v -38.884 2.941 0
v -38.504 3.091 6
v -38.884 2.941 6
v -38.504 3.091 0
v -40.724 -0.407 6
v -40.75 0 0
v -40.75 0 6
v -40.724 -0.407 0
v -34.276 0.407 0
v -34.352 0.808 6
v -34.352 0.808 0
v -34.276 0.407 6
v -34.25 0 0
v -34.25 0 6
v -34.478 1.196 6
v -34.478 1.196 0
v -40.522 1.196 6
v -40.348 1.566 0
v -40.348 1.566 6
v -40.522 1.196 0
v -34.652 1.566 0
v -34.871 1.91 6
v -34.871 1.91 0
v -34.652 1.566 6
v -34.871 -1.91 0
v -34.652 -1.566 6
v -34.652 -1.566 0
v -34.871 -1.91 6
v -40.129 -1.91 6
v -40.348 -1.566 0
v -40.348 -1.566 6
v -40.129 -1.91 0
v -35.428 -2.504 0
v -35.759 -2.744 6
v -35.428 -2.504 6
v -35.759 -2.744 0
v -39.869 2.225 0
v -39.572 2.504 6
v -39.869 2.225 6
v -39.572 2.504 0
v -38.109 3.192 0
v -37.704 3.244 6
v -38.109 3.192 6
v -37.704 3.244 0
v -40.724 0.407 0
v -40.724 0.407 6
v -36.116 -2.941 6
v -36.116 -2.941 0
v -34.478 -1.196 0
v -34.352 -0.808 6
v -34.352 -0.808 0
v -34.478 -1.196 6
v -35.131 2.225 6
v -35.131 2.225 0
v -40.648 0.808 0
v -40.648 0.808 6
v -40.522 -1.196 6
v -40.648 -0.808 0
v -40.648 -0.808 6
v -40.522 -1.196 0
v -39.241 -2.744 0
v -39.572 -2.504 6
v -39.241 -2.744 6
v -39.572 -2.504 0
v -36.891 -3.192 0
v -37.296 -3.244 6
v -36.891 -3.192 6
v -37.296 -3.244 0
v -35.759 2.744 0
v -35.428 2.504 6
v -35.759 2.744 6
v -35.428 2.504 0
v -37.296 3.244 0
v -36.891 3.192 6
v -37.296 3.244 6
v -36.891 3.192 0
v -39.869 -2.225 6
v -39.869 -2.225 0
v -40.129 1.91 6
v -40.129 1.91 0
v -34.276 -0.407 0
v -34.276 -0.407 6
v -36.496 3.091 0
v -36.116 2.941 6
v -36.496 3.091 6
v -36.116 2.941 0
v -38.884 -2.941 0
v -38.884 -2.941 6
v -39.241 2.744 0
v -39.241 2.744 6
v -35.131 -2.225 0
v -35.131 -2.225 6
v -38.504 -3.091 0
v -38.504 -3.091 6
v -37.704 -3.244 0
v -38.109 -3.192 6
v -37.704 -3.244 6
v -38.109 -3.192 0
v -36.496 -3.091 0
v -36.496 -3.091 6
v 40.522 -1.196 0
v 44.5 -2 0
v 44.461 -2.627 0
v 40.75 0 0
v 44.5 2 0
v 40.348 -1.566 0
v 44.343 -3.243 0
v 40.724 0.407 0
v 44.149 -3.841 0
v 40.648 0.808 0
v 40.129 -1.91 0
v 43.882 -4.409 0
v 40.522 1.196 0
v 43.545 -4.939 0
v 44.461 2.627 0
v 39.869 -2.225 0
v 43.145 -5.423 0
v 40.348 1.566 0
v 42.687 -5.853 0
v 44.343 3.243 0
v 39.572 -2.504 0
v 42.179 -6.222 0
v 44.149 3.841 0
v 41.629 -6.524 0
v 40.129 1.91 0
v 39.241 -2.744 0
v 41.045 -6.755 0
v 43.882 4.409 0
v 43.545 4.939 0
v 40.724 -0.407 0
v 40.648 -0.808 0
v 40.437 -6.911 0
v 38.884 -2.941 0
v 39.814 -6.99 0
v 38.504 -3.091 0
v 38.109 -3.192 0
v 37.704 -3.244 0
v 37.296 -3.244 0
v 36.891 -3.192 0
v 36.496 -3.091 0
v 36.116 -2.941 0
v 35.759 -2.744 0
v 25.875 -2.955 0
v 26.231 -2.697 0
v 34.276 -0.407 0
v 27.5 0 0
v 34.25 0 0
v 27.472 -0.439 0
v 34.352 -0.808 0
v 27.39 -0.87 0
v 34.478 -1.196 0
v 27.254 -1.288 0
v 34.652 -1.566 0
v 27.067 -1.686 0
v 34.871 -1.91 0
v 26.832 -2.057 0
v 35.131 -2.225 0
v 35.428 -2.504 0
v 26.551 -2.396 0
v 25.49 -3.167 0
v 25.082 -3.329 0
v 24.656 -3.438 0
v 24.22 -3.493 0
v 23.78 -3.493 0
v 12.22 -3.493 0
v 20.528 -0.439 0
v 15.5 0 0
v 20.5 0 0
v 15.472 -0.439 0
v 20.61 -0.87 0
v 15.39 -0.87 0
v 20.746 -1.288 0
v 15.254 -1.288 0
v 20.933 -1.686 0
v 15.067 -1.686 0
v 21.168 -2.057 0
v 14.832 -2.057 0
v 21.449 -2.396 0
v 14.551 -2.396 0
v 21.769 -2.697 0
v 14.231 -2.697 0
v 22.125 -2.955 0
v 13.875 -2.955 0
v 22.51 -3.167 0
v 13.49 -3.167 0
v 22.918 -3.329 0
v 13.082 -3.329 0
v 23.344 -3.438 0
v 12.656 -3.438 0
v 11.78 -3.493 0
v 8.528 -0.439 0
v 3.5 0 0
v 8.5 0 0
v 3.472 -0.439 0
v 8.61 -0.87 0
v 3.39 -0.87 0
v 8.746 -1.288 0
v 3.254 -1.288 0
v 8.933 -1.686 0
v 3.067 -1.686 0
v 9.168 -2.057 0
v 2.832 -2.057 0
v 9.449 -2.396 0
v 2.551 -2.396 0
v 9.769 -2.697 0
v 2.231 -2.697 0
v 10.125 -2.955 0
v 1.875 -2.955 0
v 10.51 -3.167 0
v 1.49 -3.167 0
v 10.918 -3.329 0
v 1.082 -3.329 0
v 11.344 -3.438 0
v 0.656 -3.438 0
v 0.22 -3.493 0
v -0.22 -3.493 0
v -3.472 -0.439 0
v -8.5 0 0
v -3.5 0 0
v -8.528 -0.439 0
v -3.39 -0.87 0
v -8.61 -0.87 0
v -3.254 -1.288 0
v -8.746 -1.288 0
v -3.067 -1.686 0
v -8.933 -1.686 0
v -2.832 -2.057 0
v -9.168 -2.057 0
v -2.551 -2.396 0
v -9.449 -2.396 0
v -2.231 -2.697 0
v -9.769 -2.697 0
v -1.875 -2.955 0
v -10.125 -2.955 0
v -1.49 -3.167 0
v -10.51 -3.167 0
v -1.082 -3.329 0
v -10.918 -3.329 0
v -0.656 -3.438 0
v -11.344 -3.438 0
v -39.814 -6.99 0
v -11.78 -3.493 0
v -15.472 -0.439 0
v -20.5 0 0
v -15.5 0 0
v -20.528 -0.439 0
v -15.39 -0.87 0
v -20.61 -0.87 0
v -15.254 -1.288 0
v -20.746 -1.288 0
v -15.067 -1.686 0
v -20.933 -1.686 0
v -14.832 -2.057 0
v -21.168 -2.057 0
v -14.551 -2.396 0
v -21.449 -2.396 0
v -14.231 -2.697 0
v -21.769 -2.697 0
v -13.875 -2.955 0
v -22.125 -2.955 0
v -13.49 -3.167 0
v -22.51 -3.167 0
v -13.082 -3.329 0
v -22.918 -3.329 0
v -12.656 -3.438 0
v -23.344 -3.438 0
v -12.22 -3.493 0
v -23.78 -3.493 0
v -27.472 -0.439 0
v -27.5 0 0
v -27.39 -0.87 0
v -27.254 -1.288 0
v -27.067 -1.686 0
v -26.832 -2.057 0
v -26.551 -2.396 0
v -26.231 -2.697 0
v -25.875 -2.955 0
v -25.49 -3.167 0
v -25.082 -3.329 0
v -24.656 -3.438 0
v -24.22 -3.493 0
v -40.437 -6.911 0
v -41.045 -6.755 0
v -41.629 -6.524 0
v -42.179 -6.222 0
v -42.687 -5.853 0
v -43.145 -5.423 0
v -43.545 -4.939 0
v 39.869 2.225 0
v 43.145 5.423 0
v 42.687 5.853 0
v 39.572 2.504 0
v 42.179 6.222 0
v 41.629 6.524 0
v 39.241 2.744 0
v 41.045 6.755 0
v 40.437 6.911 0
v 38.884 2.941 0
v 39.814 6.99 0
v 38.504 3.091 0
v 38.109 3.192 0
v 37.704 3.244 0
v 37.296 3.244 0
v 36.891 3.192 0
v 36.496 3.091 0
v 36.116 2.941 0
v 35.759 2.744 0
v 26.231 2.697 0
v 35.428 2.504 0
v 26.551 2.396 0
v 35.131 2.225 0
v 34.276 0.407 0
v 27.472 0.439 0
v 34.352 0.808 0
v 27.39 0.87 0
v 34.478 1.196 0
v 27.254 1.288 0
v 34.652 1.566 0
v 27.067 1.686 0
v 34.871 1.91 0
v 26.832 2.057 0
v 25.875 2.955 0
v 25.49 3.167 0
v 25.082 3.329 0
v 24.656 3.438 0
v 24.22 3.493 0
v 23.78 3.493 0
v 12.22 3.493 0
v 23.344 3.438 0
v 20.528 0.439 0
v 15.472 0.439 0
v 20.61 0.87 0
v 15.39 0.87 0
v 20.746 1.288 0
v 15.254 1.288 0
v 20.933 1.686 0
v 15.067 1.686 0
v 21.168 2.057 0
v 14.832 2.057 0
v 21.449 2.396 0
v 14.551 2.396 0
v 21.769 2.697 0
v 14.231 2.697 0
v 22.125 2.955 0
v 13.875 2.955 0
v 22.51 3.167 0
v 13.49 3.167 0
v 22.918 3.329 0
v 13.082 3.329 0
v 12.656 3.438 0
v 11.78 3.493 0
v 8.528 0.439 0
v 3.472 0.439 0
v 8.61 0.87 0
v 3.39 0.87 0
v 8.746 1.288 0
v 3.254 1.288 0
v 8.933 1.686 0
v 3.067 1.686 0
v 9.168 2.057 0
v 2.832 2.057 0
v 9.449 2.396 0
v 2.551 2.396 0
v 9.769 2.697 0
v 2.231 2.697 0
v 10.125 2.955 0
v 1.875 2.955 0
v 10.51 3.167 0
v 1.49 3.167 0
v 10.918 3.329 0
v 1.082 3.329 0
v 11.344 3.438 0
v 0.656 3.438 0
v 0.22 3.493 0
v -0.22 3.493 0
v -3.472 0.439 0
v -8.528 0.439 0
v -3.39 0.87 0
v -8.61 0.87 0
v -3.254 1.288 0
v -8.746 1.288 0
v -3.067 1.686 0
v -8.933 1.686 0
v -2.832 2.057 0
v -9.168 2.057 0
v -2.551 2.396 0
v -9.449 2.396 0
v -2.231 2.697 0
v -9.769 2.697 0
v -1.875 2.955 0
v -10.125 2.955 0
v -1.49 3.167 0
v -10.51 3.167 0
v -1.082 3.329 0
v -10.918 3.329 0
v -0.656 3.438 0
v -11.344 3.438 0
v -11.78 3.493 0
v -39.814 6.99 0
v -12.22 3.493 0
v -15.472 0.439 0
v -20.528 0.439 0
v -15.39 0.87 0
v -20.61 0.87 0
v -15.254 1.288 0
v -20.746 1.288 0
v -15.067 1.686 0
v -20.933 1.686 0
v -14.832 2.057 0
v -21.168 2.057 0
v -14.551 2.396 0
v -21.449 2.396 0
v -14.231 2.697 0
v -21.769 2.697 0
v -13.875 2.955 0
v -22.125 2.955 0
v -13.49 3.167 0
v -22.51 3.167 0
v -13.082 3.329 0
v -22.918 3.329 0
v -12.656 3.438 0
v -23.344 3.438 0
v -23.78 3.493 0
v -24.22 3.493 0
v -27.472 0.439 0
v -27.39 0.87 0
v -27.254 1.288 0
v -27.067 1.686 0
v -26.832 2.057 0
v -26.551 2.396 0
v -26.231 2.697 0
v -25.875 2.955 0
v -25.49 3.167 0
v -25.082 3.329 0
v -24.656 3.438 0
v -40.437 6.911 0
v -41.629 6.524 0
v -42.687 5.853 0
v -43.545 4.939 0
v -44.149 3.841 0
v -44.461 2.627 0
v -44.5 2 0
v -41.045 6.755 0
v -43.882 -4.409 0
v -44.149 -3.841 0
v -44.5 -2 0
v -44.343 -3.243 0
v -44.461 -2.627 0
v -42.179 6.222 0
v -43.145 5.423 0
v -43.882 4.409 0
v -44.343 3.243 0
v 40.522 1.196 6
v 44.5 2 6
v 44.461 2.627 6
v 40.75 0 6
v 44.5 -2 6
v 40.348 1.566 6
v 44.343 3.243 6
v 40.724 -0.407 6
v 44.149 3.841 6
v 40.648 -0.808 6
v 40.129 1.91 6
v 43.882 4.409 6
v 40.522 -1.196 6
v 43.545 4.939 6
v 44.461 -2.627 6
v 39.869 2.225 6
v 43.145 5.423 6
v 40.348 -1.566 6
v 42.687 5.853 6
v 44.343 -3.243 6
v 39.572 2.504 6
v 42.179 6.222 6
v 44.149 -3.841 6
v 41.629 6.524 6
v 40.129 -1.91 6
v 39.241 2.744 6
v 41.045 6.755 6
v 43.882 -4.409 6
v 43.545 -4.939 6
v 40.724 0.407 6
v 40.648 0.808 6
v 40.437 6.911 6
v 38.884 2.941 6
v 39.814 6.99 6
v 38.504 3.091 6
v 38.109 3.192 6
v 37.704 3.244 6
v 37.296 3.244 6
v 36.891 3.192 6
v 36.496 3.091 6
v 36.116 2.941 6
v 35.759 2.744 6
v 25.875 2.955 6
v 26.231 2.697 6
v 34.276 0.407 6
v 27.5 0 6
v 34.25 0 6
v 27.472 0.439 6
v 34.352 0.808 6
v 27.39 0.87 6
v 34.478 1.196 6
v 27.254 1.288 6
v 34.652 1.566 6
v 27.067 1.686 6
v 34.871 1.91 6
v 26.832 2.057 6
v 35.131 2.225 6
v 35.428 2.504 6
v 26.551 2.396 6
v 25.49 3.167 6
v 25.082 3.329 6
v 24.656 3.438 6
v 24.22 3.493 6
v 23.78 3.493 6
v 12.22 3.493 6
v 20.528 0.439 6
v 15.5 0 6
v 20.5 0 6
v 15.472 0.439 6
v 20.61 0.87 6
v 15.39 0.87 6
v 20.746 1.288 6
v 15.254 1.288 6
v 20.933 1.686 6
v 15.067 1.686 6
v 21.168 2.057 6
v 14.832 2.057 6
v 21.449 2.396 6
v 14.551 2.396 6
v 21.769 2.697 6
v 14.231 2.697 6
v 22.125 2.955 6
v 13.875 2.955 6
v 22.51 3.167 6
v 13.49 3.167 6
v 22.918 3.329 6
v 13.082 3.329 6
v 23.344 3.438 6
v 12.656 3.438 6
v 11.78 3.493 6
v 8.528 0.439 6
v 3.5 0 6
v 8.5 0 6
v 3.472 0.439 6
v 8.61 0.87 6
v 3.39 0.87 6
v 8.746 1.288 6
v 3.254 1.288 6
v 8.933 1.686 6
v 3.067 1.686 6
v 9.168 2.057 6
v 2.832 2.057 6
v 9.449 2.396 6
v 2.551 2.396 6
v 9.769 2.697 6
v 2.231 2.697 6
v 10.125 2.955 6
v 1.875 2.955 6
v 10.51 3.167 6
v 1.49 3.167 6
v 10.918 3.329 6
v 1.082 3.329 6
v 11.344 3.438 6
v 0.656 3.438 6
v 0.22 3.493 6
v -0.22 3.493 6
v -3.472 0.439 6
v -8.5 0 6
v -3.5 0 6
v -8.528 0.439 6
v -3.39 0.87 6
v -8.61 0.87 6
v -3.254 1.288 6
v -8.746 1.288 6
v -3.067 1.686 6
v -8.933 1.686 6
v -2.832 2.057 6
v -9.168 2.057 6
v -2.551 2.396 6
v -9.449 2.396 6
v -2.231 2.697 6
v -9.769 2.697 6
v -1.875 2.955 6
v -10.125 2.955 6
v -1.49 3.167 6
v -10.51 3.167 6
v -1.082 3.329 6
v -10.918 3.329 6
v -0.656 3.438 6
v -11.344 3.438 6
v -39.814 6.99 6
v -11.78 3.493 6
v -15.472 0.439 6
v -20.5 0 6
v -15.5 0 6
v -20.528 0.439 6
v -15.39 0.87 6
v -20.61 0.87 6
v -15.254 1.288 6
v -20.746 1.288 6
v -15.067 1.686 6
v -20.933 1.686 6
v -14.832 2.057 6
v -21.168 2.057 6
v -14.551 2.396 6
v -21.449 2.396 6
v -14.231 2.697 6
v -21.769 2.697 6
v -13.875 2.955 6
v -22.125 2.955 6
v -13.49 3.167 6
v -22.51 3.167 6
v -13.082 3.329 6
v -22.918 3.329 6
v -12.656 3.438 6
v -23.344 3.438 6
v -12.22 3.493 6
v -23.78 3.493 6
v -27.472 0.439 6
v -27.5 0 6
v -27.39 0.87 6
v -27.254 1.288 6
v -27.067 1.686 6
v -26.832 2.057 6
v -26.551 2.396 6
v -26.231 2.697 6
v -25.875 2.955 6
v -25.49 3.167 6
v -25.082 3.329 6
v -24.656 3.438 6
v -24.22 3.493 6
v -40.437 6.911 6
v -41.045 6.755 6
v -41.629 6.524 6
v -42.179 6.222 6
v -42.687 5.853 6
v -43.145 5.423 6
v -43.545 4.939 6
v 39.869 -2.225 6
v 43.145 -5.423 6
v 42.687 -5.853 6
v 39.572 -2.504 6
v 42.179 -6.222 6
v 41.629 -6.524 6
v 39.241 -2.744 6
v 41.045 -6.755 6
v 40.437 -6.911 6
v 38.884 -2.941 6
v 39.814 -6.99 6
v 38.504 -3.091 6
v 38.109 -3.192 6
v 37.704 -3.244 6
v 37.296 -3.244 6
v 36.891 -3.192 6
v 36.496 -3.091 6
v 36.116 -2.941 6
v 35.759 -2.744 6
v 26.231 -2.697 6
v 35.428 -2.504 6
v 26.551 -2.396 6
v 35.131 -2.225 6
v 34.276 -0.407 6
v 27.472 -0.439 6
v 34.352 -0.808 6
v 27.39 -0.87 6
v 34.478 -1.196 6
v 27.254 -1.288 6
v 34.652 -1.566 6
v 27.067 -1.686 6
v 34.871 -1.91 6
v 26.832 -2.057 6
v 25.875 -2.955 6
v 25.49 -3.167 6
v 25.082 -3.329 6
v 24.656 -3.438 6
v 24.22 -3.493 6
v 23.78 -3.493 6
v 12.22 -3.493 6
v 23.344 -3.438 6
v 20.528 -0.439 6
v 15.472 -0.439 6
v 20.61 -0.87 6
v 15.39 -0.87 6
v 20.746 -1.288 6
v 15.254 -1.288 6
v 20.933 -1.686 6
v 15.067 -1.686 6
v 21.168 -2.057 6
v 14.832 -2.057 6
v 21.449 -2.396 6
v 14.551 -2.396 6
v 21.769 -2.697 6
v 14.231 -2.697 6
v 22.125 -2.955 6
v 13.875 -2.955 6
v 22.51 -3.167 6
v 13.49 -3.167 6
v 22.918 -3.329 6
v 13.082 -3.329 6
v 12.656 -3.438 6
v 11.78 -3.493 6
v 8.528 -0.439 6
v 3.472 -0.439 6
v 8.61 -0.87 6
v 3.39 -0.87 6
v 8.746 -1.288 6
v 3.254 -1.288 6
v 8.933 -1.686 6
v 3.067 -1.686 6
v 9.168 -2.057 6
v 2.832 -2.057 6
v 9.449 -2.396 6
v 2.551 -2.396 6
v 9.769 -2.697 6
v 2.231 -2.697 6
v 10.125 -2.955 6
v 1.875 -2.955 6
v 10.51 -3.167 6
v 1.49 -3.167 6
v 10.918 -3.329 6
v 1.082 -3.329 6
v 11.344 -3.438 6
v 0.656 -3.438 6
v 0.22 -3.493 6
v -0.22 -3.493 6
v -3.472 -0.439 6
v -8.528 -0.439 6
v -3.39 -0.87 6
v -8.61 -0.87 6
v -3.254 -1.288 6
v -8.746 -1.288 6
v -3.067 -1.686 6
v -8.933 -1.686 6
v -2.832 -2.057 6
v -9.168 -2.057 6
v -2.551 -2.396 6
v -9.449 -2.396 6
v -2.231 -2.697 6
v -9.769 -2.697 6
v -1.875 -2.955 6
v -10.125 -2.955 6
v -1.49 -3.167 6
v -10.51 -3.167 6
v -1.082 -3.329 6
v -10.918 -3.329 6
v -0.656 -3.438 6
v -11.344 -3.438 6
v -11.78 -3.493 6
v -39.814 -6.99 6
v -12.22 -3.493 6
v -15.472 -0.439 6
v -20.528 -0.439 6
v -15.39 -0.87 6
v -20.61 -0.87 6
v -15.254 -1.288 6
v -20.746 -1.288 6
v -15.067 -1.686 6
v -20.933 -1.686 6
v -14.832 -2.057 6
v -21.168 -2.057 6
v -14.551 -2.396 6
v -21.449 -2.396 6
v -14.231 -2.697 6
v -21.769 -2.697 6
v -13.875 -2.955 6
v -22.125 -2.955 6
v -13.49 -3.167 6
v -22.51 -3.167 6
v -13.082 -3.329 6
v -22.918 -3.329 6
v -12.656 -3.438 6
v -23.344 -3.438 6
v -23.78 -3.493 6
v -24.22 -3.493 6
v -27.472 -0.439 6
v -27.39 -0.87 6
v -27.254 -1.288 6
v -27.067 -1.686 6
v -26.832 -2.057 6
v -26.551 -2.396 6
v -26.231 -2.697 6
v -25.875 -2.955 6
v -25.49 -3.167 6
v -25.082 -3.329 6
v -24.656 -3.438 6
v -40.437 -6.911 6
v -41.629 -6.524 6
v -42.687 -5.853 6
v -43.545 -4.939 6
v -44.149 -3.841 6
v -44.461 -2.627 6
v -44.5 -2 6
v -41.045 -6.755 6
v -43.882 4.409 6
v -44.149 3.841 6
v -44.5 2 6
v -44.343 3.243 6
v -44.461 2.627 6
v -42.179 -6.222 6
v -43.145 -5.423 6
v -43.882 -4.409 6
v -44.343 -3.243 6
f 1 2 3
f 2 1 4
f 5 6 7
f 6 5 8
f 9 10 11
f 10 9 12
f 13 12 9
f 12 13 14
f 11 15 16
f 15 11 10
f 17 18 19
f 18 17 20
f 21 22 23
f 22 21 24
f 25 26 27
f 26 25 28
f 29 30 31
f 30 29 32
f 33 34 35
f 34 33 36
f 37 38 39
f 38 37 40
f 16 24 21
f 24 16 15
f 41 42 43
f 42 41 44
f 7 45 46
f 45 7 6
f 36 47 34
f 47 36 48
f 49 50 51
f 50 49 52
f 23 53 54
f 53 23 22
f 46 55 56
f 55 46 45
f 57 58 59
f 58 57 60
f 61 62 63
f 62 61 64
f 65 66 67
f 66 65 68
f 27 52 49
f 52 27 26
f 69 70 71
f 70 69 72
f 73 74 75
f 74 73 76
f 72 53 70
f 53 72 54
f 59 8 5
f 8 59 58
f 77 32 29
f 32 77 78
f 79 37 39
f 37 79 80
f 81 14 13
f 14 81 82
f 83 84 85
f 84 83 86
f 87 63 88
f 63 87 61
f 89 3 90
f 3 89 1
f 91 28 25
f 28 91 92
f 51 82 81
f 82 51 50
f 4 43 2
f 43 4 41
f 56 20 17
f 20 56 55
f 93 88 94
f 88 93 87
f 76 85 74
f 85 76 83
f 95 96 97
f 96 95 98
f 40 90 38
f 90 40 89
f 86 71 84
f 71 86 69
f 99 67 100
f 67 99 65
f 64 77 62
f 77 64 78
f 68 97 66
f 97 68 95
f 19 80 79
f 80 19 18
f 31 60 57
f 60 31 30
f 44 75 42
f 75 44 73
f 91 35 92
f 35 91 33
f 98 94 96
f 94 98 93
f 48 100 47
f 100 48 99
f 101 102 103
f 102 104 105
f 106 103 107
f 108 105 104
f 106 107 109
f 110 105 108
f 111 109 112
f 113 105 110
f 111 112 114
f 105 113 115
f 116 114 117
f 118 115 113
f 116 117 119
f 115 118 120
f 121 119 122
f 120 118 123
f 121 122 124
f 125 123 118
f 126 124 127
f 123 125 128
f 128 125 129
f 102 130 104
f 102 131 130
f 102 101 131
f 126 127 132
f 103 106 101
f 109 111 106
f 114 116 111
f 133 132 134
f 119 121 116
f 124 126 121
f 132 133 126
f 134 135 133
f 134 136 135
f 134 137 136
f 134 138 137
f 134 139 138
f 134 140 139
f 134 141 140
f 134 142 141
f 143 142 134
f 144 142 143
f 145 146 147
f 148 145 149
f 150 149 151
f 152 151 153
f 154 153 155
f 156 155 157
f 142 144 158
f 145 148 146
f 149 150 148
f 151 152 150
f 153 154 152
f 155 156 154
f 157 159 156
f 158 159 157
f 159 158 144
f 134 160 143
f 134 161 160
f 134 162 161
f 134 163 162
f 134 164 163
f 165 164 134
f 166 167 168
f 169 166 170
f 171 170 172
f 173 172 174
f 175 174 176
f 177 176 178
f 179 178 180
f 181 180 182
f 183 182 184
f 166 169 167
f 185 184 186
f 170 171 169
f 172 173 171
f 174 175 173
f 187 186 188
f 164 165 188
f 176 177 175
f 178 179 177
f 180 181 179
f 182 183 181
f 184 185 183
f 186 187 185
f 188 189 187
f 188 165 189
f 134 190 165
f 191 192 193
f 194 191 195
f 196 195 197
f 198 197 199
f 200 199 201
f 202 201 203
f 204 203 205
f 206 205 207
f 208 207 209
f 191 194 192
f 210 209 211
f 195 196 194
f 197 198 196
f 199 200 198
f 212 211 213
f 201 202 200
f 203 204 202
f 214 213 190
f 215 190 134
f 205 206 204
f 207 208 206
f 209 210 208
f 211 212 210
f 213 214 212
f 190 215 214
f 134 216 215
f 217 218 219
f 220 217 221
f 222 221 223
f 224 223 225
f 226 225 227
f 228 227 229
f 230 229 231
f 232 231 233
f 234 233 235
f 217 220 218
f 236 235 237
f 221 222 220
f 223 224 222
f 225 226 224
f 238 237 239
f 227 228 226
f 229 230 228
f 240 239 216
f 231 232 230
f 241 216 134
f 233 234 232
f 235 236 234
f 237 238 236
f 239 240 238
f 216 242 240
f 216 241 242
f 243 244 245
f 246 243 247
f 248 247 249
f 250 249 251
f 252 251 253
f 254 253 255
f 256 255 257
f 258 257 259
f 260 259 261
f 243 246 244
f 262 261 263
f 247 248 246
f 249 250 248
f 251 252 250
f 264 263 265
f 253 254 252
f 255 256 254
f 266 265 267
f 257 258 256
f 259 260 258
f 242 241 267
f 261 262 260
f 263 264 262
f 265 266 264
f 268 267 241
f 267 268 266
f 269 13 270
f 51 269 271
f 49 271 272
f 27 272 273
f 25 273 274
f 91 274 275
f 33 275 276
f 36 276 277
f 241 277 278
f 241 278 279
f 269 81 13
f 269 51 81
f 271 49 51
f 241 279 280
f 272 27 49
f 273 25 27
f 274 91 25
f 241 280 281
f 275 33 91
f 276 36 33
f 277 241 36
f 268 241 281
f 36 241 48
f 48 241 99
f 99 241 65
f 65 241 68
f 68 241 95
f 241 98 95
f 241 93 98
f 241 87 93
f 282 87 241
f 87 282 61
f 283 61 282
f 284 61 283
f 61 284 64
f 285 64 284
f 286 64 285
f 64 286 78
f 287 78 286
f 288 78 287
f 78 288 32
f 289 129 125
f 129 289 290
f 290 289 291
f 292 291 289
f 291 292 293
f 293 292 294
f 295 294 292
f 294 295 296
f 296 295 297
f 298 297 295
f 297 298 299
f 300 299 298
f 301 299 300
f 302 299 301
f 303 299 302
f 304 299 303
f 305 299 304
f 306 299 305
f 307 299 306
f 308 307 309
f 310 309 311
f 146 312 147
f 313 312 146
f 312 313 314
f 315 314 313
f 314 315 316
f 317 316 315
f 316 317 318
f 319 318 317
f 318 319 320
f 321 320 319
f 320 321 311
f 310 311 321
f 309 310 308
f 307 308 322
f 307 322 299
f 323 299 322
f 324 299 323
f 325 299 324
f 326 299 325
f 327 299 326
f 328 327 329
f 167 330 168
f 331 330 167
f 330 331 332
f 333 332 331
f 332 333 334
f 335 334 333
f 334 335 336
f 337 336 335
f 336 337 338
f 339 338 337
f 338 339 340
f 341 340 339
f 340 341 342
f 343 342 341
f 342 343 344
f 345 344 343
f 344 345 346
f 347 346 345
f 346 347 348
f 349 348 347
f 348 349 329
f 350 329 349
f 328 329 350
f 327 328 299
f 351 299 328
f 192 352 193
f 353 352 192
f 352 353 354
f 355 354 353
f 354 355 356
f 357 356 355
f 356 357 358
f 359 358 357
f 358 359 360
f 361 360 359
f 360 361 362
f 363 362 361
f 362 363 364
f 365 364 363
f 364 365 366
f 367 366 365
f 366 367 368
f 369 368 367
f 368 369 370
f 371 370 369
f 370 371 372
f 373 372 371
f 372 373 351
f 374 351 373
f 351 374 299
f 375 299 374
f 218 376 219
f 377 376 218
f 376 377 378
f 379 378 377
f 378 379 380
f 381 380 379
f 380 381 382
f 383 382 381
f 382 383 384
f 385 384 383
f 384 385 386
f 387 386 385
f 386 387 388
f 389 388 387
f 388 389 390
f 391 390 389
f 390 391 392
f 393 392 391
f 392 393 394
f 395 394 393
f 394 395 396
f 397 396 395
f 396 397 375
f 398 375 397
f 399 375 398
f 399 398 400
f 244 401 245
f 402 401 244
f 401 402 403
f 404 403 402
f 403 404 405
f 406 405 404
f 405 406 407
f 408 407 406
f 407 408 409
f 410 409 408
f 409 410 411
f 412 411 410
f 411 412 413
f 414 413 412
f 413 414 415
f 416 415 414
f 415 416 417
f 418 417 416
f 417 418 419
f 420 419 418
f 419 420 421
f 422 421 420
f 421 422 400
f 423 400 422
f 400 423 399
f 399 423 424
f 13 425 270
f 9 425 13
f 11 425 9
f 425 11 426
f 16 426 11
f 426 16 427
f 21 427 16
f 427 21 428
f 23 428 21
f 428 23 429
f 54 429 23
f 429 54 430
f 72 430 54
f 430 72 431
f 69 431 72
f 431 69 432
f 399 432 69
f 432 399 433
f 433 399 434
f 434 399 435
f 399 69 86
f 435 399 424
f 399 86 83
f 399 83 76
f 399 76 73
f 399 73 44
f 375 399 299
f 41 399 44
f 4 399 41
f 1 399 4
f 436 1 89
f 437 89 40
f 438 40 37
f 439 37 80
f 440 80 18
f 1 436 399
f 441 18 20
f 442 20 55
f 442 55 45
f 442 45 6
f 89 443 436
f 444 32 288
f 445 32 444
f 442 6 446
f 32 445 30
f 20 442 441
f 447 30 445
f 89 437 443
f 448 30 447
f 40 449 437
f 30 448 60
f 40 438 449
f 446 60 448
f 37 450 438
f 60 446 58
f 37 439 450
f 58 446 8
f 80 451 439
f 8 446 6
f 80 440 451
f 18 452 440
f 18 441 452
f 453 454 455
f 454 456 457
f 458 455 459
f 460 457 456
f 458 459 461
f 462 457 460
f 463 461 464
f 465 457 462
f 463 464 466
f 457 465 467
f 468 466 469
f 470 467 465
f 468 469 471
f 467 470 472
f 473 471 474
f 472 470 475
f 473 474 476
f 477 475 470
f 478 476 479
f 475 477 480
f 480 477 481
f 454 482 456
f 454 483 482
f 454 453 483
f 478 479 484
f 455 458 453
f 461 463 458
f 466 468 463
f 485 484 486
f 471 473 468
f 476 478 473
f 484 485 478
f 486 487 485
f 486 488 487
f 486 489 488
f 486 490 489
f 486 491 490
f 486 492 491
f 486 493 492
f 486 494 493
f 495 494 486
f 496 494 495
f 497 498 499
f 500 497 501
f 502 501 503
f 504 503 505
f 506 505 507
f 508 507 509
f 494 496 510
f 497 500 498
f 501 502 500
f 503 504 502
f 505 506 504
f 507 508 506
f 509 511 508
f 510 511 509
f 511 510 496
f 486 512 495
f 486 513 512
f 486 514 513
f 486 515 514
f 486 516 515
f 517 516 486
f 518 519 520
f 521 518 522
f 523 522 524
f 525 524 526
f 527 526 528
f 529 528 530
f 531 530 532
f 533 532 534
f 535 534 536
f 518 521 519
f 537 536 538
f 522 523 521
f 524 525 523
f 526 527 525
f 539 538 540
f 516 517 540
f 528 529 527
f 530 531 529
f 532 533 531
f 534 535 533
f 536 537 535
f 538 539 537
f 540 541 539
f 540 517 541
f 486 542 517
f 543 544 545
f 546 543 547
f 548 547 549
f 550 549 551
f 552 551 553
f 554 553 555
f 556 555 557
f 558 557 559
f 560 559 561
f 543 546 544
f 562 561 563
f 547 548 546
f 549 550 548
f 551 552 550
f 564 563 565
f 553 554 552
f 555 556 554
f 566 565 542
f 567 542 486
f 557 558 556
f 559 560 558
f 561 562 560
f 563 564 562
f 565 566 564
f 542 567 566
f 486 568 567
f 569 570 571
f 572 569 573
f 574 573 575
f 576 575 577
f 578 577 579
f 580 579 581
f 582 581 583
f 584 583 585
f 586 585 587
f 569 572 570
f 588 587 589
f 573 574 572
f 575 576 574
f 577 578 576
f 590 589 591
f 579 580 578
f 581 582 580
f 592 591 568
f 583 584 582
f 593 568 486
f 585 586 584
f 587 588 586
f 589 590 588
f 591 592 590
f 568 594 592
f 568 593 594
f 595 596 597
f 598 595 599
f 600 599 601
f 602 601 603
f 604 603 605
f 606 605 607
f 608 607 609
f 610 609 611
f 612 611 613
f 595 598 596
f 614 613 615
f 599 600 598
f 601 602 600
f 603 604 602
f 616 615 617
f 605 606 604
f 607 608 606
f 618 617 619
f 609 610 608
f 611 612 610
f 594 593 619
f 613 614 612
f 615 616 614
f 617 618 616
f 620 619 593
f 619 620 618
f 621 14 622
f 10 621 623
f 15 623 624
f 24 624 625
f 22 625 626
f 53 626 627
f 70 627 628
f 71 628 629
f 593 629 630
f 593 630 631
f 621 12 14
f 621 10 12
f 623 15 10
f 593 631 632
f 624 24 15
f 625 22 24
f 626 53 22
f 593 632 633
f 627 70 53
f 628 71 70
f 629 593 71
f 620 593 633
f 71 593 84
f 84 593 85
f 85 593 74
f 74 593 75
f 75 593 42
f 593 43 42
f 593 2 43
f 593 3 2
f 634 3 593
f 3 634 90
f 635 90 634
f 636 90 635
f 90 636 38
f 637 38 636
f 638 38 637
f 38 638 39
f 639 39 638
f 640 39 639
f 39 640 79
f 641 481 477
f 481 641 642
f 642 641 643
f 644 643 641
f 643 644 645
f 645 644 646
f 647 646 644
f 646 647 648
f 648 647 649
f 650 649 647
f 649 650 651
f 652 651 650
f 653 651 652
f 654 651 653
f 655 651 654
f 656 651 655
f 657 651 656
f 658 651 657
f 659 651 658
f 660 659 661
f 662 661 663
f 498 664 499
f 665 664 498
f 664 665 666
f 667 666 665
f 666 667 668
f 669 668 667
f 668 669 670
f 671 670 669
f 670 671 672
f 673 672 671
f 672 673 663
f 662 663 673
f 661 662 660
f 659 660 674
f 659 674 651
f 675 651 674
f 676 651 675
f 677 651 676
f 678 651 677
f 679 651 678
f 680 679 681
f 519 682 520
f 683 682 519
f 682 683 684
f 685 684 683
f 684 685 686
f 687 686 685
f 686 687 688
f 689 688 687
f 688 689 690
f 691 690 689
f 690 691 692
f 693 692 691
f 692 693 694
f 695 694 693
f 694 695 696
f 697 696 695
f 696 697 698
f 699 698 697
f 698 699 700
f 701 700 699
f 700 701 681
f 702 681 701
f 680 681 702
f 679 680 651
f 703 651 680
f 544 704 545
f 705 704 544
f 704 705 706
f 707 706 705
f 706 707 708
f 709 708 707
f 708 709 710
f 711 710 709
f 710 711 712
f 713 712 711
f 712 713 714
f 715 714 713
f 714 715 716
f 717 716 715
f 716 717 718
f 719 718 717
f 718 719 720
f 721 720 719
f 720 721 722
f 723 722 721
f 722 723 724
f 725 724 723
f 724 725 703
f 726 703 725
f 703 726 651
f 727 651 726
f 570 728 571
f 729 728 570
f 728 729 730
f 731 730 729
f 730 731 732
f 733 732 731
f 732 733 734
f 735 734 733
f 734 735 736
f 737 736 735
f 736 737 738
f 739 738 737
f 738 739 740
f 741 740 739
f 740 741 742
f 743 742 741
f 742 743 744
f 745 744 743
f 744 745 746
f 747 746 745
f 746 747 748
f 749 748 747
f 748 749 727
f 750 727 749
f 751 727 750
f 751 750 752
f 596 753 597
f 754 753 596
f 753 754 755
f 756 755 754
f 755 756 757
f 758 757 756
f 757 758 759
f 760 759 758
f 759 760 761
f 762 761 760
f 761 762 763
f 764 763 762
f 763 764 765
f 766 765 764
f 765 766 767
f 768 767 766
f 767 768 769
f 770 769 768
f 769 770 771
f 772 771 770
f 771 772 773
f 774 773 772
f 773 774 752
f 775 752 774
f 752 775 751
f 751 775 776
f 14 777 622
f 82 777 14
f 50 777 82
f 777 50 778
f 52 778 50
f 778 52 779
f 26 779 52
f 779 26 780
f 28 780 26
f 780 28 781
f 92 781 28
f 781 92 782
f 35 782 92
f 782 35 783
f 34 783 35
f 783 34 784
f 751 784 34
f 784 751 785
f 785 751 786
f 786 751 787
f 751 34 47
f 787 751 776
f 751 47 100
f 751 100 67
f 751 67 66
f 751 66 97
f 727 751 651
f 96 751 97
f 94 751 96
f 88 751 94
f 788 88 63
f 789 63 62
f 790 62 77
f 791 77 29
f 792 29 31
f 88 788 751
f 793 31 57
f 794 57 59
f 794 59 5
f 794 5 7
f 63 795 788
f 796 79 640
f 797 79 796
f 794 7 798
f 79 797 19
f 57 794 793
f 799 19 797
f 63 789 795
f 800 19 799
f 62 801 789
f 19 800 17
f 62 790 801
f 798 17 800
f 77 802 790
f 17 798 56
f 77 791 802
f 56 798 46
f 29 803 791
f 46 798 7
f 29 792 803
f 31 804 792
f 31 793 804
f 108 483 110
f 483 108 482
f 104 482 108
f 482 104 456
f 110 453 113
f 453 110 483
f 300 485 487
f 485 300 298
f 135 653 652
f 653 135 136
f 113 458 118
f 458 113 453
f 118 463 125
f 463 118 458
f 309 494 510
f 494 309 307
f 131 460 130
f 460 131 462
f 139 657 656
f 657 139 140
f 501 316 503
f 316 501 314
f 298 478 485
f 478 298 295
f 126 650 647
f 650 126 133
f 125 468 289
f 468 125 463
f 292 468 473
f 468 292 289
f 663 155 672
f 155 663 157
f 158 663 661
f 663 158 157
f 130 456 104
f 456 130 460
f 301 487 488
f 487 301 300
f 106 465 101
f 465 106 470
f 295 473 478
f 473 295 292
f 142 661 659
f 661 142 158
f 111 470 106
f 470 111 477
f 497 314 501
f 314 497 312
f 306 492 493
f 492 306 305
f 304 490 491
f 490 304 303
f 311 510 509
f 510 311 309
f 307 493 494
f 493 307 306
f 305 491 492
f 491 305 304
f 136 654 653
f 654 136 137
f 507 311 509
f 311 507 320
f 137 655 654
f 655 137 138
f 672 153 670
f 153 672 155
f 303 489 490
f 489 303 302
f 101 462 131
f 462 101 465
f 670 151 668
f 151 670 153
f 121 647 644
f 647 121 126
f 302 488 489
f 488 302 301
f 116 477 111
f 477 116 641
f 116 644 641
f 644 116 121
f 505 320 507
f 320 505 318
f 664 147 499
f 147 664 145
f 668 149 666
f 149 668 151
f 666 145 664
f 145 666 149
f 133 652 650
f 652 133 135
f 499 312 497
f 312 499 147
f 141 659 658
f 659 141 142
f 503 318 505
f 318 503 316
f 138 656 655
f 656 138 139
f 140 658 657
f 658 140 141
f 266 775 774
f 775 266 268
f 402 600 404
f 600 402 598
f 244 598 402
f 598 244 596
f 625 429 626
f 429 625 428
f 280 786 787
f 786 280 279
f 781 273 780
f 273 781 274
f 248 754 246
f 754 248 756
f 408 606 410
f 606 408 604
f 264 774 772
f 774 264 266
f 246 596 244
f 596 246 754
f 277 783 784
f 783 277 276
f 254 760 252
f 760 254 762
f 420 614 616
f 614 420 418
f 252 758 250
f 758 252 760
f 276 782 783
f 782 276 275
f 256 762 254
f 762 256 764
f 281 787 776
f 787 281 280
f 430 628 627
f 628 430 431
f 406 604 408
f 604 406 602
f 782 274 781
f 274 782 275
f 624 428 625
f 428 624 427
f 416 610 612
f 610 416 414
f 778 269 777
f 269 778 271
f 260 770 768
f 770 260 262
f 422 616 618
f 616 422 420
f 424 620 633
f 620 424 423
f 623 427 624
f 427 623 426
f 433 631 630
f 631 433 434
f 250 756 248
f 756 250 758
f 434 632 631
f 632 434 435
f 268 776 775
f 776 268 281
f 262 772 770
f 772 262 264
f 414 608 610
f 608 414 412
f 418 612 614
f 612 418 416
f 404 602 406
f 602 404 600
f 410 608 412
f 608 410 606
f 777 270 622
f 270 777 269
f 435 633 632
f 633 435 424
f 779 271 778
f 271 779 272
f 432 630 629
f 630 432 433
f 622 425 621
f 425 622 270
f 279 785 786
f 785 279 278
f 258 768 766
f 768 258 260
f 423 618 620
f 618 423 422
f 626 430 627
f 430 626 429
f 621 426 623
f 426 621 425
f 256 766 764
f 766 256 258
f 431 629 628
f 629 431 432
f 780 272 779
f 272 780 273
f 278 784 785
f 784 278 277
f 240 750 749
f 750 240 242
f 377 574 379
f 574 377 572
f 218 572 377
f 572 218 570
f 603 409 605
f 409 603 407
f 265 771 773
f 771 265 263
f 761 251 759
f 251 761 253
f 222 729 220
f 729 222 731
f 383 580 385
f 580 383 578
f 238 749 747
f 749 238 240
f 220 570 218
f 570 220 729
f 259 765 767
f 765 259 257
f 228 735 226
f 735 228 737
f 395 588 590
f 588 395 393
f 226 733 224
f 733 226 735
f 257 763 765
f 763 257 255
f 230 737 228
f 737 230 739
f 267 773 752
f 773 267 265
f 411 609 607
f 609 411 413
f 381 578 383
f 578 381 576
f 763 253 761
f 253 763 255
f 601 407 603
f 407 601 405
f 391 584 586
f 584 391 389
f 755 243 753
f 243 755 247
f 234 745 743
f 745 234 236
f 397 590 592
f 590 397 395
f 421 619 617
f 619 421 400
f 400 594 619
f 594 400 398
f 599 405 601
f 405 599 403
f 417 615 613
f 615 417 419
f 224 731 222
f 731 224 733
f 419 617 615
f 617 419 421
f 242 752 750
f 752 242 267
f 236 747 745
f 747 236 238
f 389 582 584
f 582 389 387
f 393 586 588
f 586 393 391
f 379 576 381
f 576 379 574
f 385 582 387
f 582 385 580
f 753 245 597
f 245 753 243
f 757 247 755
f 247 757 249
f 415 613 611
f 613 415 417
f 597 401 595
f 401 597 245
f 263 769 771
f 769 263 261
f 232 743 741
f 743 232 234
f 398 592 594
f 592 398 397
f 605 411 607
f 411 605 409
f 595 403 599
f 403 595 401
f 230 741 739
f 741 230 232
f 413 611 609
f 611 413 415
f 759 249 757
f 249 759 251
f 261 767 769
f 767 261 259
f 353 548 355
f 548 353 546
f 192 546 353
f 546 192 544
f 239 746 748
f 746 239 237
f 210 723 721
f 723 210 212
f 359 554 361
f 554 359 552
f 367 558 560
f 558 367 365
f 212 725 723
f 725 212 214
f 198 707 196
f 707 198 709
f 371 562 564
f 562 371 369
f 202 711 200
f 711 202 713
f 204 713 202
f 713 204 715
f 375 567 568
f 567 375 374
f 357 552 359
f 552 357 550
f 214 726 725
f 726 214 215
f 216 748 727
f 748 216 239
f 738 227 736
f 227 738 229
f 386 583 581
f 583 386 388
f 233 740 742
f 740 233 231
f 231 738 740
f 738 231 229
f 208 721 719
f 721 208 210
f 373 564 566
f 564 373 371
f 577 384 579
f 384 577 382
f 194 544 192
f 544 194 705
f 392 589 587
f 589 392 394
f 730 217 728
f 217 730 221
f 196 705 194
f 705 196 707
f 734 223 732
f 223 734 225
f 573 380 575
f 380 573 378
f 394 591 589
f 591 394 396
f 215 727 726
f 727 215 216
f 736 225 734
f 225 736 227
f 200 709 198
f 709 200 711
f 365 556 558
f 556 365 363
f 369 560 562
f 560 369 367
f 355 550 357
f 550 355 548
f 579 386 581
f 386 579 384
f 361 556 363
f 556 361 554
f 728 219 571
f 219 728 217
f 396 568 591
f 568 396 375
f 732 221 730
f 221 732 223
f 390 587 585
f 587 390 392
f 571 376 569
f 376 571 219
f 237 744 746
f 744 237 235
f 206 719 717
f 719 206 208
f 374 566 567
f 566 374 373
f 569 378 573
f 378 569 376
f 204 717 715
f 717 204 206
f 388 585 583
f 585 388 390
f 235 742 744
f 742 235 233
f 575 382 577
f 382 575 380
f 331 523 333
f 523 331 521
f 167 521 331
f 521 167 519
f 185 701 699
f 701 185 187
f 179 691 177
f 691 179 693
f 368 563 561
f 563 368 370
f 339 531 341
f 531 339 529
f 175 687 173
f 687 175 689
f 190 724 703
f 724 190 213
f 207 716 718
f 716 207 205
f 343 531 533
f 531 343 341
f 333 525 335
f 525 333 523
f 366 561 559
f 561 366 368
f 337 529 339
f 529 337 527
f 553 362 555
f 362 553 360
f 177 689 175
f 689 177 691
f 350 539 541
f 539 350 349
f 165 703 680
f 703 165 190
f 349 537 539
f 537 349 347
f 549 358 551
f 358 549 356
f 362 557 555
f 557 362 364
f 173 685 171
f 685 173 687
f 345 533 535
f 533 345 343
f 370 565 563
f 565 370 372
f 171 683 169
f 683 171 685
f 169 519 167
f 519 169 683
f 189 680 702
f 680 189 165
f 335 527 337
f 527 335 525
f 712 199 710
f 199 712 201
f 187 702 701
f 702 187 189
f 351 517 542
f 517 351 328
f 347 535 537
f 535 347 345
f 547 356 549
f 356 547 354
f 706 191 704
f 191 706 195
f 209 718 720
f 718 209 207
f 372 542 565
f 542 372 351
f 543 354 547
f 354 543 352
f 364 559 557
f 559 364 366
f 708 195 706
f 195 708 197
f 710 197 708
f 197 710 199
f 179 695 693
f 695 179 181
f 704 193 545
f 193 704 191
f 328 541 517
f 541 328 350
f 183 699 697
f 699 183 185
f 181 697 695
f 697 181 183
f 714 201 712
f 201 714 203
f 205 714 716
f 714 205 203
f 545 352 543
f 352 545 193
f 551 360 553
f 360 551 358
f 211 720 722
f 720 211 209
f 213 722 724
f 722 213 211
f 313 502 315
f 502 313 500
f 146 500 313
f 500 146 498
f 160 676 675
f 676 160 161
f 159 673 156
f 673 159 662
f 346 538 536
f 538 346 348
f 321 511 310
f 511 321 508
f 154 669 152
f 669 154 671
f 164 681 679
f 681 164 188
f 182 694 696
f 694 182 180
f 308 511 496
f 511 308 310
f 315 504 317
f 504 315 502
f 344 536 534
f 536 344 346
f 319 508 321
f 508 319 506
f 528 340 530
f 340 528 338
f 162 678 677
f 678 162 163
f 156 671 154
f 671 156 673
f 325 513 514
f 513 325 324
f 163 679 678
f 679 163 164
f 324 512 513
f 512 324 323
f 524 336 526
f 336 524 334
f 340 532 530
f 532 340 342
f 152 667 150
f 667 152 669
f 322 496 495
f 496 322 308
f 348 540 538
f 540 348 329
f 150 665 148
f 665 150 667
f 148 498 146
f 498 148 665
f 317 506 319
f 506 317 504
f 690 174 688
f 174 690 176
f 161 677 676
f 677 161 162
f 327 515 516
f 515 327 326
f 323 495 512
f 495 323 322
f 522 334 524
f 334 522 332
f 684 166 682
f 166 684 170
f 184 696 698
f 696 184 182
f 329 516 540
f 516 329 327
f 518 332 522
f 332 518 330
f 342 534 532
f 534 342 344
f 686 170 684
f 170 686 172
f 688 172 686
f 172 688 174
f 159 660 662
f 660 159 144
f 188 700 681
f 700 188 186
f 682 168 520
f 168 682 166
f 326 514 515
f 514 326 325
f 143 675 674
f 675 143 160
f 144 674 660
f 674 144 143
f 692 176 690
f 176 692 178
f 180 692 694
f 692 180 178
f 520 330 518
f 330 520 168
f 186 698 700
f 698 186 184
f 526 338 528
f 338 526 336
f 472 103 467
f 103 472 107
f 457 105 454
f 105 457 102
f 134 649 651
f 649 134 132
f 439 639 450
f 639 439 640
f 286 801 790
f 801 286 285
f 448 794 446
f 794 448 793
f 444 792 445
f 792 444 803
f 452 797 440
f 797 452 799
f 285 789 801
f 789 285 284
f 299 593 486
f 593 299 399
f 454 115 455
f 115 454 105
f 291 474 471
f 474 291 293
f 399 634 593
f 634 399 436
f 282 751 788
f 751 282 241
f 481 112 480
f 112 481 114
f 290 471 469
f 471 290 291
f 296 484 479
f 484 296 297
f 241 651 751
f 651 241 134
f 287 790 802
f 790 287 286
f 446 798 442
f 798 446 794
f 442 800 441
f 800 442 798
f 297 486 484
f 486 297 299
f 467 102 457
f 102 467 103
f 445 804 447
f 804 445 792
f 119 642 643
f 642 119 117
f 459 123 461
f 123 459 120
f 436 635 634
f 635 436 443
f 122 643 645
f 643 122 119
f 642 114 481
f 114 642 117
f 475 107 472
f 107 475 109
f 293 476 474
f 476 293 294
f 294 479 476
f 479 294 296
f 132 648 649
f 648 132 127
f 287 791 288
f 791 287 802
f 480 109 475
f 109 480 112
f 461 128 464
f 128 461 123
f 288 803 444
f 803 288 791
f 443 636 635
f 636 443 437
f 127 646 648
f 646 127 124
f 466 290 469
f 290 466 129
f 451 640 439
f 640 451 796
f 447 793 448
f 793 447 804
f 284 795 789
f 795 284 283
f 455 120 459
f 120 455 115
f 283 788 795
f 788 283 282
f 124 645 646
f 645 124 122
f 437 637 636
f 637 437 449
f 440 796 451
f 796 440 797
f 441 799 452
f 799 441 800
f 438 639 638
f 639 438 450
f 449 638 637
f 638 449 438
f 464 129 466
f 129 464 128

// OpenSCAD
$fn = 50;

difference() {
	union() {
		hull() {
			translate(v = [-39.5, 2.0, 0]) {
				cylinder(h = 6, r = 5);
			}
			translate(v = [39.5, 2.0, 0]) {
				cylinder(h = 6, r = 5);
			}
			translate(v = [-39.5, -2.0, 0]) {
				cylinder(h = 6, r = 5);
			}
			translate(v = [39.5, -2.0, 0]) {
				cylinder(h = 6, r = 5);
			}
		}
	}
	union() {
		translate(v = [-37.5, 0.0, 0]) {
			cylinder(h = 6, r = 3.25);
		}
		translate(v = [37.5, 0.0, 0]) {
			cylinder(h = 6, r = 3.25);
		}
		translate(v = [-24.0, 0, 0.0]) {
			cylinder(h = 6, r = 3.5);
		}
		translate(v = [-12.0, 0, 0.0]) {
			cylinder(h = 6, r = 3.5);
		}
		cylinder(h = 6, r = 3.5);
		translate(v = [12.0, 0, 0.0]) {
			cylinder(h = 6, r = 3.5);
		}
		translate(v = [24.0, 0, 0.0]) {
			cylinder(h = 6, r = 3.5);
		}
	}
}
